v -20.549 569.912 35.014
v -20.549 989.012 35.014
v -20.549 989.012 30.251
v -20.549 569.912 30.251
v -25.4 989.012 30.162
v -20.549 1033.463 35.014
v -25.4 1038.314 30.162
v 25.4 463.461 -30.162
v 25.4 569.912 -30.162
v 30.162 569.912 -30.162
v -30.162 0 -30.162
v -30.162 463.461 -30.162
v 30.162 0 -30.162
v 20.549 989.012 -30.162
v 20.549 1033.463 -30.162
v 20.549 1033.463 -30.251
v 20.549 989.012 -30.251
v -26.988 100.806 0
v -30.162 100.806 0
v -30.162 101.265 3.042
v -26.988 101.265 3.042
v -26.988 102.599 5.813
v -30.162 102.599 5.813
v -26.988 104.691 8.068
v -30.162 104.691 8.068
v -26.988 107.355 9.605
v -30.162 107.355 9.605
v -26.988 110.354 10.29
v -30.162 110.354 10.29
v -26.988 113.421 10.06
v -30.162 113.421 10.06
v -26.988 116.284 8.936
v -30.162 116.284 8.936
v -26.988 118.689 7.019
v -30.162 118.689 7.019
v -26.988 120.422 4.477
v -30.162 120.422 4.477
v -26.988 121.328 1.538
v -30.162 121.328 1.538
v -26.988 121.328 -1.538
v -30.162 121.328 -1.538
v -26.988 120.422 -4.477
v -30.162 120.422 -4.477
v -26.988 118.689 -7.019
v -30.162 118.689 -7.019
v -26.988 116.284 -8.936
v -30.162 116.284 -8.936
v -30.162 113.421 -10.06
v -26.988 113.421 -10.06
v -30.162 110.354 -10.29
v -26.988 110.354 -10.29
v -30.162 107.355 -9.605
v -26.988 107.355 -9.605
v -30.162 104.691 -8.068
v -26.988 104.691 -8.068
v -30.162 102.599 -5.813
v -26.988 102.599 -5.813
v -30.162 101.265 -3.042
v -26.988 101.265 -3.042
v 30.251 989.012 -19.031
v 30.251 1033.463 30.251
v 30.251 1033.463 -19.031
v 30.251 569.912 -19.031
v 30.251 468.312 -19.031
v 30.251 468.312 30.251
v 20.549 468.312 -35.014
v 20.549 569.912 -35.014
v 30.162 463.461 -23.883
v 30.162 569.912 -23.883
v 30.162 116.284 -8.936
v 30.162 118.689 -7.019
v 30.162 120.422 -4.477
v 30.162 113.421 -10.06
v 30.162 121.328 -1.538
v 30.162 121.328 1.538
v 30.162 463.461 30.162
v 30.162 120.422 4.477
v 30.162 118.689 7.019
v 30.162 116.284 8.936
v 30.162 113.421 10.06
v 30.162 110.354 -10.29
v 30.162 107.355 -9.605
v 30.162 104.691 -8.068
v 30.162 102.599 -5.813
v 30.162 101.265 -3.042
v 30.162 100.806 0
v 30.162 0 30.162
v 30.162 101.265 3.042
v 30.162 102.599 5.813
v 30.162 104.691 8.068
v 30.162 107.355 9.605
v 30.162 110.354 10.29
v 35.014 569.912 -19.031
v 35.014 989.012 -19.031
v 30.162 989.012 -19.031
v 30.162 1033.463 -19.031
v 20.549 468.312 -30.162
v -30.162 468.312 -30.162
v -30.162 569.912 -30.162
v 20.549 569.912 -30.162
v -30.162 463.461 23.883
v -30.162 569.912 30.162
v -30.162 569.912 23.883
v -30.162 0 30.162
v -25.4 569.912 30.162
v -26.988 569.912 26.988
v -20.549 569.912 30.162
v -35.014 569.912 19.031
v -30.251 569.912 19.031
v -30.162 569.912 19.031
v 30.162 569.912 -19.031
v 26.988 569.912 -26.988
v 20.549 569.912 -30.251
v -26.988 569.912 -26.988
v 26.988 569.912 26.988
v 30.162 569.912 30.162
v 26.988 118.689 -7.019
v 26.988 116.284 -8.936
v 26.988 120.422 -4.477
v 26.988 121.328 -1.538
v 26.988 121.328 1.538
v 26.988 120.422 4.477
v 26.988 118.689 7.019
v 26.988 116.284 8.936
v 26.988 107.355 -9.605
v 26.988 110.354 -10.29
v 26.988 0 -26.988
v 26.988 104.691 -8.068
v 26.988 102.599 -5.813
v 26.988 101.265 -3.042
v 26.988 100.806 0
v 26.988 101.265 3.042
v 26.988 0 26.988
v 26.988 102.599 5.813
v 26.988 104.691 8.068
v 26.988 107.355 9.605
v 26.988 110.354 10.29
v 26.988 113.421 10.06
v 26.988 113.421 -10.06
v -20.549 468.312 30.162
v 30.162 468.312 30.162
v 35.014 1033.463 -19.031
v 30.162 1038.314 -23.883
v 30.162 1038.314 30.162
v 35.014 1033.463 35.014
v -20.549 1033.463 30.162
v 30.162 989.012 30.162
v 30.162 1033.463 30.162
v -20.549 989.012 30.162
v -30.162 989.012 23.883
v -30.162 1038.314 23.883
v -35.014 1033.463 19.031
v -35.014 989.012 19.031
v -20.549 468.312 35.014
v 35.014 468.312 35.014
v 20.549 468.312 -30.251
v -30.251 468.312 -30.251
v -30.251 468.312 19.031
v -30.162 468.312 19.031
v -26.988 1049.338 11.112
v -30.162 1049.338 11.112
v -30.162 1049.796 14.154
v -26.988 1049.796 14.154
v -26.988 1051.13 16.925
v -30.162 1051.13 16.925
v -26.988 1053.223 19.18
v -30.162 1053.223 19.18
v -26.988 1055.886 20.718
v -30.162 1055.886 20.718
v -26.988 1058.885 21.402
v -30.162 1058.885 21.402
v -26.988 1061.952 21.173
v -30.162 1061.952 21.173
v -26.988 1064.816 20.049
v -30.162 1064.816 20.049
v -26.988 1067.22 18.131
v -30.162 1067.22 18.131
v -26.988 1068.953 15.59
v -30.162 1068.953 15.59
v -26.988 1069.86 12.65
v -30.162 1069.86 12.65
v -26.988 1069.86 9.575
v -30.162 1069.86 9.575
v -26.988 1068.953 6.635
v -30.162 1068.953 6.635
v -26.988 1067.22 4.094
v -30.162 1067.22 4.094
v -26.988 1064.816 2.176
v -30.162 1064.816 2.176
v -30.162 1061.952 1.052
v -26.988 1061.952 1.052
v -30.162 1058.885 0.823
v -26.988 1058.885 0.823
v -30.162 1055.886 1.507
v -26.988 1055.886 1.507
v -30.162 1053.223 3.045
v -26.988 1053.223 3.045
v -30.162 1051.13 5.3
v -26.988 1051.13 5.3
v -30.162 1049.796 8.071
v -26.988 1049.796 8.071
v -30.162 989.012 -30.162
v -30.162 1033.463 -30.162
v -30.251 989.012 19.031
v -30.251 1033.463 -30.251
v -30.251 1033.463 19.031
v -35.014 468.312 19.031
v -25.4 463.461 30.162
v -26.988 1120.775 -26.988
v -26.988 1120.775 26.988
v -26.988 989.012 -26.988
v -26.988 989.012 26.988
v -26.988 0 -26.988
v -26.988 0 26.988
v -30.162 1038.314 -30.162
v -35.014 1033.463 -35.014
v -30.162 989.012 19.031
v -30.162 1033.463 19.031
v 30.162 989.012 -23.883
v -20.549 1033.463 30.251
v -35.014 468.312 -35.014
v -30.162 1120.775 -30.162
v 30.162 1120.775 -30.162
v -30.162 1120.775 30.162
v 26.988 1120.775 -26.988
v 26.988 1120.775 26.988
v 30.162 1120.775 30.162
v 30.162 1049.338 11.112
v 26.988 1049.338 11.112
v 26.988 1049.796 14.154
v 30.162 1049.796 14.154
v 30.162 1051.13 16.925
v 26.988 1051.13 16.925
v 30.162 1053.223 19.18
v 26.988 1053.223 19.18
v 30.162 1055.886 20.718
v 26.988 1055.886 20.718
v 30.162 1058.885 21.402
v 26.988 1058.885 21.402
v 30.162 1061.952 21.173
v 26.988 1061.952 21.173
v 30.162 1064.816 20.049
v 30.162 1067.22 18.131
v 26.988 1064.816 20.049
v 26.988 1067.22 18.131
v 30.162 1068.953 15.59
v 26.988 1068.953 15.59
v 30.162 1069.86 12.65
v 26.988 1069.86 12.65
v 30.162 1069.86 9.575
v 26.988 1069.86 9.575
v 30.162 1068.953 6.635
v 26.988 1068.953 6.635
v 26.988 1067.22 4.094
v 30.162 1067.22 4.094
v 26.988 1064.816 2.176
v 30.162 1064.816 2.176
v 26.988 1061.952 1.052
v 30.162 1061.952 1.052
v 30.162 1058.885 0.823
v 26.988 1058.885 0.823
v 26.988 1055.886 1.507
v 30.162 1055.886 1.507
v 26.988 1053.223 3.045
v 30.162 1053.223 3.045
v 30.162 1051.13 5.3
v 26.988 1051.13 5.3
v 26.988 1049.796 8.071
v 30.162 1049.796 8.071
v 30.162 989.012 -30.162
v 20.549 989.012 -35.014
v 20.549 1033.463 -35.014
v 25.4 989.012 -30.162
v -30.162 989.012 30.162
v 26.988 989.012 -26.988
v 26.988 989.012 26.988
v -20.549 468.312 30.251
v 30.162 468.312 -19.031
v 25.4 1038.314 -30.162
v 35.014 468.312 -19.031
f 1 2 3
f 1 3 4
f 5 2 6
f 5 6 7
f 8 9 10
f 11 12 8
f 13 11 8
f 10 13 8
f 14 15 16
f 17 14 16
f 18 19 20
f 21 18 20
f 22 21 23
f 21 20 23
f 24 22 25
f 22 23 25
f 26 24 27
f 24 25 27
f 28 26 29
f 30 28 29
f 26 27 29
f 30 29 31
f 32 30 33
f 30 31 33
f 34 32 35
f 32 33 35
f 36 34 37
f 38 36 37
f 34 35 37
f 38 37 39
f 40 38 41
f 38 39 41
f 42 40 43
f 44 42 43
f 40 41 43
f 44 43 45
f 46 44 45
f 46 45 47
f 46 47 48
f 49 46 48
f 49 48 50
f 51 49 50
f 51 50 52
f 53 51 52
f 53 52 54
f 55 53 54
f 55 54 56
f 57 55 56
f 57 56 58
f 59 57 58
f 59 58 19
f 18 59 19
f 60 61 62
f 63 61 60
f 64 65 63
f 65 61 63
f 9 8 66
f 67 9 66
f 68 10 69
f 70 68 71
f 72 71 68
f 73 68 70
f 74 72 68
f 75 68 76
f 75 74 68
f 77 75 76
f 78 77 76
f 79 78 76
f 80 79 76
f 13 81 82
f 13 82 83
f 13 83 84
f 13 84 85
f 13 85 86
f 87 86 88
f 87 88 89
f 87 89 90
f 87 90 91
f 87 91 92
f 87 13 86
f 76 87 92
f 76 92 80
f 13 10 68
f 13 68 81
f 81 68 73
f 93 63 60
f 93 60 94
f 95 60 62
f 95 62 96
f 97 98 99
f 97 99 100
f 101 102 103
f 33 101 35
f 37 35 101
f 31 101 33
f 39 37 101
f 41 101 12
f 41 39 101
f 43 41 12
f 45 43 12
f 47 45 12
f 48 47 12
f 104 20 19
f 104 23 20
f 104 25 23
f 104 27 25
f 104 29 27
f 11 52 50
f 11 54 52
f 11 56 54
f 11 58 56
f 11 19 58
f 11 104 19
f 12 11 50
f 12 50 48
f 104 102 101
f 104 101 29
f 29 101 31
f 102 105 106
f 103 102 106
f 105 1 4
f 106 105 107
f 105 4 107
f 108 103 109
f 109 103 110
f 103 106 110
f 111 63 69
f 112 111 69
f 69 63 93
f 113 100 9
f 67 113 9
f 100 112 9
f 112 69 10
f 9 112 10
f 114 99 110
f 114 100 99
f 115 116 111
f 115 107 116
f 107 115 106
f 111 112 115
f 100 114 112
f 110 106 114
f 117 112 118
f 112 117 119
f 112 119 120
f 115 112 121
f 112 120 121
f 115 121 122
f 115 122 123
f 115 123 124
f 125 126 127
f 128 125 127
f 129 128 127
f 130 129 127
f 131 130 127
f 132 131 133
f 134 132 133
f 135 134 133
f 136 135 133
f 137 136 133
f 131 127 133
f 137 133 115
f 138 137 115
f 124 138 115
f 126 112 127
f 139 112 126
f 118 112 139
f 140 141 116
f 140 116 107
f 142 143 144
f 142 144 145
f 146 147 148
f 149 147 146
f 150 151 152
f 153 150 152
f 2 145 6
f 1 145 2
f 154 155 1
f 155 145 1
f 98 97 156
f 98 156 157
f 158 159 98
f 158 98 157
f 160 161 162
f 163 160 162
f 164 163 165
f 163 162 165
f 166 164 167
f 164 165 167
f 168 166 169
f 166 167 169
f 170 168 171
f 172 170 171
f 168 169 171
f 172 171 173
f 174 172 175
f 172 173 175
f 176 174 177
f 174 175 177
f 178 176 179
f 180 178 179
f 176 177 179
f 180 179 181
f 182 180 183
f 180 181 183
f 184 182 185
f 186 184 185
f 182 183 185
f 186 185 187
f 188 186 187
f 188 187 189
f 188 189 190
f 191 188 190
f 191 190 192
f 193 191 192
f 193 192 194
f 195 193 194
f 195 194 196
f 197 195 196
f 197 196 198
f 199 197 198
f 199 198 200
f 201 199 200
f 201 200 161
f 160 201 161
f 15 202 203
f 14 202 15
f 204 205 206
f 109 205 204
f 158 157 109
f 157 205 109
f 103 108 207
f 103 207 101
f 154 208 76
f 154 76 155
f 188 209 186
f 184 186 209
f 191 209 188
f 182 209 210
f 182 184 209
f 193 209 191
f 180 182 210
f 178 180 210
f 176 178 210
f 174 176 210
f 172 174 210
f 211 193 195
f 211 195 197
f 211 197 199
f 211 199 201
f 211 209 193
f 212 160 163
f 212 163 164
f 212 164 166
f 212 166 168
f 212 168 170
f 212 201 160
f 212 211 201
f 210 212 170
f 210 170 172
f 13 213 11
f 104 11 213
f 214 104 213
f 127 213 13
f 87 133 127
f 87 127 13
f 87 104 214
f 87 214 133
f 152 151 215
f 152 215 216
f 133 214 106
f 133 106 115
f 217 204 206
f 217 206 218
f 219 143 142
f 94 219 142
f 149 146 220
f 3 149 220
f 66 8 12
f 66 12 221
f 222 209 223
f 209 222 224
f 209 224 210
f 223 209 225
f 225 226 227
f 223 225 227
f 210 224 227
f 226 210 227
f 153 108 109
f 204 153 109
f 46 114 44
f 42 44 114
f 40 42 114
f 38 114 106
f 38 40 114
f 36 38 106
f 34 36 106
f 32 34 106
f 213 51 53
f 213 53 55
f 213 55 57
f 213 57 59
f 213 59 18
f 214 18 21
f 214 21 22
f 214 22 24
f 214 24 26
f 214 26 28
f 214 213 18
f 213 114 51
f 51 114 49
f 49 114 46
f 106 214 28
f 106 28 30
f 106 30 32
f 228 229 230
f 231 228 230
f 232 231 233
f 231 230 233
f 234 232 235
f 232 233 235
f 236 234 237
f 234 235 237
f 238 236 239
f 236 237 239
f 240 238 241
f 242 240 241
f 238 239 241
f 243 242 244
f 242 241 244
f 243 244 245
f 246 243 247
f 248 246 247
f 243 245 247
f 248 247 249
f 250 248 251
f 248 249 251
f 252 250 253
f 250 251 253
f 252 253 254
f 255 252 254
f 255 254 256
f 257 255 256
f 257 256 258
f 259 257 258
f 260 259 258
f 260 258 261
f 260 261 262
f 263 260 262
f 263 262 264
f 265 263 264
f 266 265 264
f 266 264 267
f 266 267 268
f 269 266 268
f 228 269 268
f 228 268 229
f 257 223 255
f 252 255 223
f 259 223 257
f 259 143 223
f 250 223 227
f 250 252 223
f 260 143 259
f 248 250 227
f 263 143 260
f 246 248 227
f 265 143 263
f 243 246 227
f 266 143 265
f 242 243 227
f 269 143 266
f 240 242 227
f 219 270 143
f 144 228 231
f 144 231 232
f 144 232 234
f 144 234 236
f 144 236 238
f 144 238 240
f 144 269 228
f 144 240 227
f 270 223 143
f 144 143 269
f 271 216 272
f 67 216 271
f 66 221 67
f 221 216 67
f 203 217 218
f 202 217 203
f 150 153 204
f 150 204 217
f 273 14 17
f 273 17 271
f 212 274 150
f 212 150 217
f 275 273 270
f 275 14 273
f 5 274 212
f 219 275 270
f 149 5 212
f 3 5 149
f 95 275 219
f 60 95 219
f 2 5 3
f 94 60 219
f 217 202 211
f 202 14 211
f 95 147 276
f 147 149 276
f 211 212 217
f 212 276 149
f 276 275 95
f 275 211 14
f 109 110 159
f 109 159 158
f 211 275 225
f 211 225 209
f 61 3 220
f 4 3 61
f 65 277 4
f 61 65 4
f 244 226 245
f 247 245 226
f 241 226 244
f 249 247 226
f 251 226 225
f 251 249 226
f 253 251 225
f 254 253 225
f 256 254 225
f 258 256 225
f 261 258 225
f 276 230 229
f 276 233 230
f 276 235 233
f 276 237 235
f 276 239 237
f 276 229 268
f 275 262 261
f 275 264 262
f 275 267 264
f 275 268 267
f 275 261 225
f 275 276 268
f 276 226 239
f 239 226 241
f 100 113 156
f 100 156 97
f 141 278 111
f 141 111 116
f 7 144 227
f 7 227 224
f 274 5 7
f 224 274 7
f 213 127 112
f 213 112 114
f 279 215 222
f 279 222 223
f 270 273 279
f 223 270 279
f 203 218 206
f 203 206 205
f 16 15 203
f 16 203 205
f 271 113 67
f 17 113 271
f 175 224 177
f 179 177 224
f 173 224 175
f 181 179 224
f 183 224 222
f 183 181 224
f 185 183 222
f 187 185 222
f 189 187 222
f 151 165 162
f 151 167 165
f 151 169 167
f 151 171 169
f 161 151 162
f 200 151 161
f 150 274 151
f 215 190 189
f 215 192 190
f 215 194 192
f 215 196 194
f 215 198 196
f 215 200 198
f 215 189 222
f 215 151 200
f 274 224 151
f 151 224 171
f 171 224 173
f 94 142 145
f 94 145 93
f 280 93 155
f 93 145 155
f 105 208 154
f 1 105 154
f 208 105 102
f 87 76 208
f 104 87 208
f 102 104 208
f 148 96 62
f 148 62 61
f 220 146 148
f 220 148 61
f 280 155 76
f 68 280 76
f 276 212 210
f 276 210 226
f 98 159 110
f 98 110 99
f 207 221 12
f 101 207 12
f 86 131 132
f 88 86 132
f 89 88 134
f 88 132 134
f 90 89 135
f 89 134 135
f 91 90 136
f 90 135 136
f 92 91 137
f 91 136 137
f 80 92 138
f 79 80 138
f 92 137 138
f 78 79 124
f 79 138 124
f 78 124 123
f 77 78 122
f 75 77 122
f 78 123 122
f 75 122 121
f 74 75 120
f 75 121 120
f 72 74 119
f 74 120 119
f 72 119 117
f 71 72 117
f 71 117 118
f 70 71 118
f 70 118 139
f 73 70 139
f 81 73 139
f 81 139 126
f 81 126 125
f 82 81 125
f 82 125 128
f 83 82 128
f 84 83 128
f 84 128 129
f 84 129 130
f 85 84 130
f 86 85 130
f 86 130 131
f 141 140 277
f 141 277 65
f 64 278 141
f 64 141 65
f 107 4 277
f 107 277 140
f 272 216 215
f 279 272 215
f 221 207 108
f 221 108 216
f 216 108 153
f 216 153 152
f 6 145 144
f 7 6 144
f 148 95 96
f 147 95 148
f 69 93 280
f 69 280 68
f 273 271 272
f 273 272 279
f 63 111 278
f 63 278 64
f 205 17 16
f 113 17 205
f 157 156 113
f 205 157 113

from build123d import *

# Parameters (mm, degrees)
F1_DEPTH  = 1120.775
F3_DEPTH  = 53.34
F6_DEPTH  = 565.15
F8_DEPTH  = 55.5625
F10_DEPTH = 45.155127
F12_DEPTH = 25.4
F14_DEPTH = 25.4
F16_DEPTH = 55.5625
F18_DEPTH = 49.193727
F20_DEPTH = 25.4
F22_DEPTH = 113.792
F24_DEPTH = 25.4
F26_DEPTH = 25.4
F28_DEPTH = 25.4
F30_DEPTH = 254
F32_DEPTH = 63.5
F34_DEPTH = 25.4
F36_DEPTH = 25.4
F38_DEPTH = 25.4
F40_DEPTH = 25.4
F41_W     = 53.975
F41_H     = 53.975
F42_DEPTH = 1239.52
F43_R     = 10.31875
F44_DEPTH = 89.662
F45_R     = 10.31875
F46_DEPTH = 179.832


with BuildPart() as f1:
    # F0 (on Front) → F1 (new body)
    with BuildSketch(Plane.XZ):
        Polygon((30.1625, 30.1625), (26.9875, 30.1625), (-26.9875, 30.1625), (-30.1625, 30.1625), (-30.1625, 26.9875), (-30.1625, -26.9875), (-30.1625, -30.1625), (-26.9875, -30.1625), (26.9875, -30.1625), (30.1625, -30.1625), (30.1625, -26.9875), (30.1625, 26.9875), align=None)
        Polygon((-23.8125, 26.9875), (23.8125, 26.9875), (26.9875, 26.9875), (26.9875, 23.8125), (26.9875, -23.8125), (26.9875, -26.9875), (23.8125, -26.9875), (-23.8125, -26.9875), (-26.9875, -26.9875), (-26.9875, -23.8125), (-26.9875, 23.8125), (-26.9875, 26.9875), align=None, mode=Mode.SUBTRACT)
    extrude(amount=-F1_DEPTH)

    # F2 (on Right) → F3 (cut, symmetric)
    with BuildSketch(Plane.YZ):
        Polygon((569.9125, 80.052234), (569.9125, 0), (569.9125, -86.322285), (989.0125, -86.322285), (989.0125, 80.052234), align=None)
    extrude(amount=F3_DEPTH, both=True, mode=Mode.SUBTRACT)



with BuildPart() as f6:
    # F5 (on offset) → F6 (new body)
    with BuildSketch(Plane.XZ.offset(-468.3125)):
        Polygon((-20.5486, 35.0139), (-20.5486, 30.2514), (30.2514, 30.2514), (30.2514, -19.031227), (35.0139, -19.031227), (35.0139, 35.0139), align=None)
        Polygon((-30.2514, 19.031227), (-35.0139, 19.031227), (-35.0139, -35.0139), (20.5486, -35.0139), (20.5486, -30.2514), (-30.2514, -30.2514), align=None)
    extrude(amount=-F6_DEPTH)


with BuildPart() as f1_1:
    add(f1.part)

    add(f6.part)  # F8 merges F6
    # F7 (on face) → F8 (join, through all)
    with BuildSketch(Plane(origin=(-20.5486, 0, 0), x_dir=(0, -1, 0), z_dir=(-1, 0, 0))):
        Polygon((-1033.4625, 30.2514), (-1033.4625, 35.0139), (-1042.3525, 26.1239), (-1033.4625, 26.1239), align=None)
        Polygon((-459.4225, 26.1239), (-468.3125, 35.0139), (-468.3125, 30.2514), (-468.3125, 26.1239), align=None)
    extrude(amount=-F8_DEPTH)

    # F9 (on face) → F10 (join, through all)
    with BuildSketch(Plane(origin=(0, 0, -19.031227), x_dir=(1, 0, 0), z_dir=(0, 0, -1))):
        Polygon((30.2514, -468.3125), (35.0139, -468.3125), (26.1239, -459.4225), (26.1239, -468.3125), align=None)
        Polygon((26.1239, -1042.3525), (35.0139, -1033.4625), (30.2514, -1033.4625), (26.1239, -1033.4625), align=None)
    extrude(amount=-F10_DEPTH)

    # F11 (on face) → F12 (cut)
    with BuildSketch(Plane(origin=(0, 0, 26.1239), x_dir=(1, 0, 0), z_dir=(0, 0, -1))):
        Polygon((35.0139, -459.4225), (30.1625, -459.4225), (30.1625, -463.4611), (35.0139, -468.3125), align=None)
    extrude(amount=-F12_DEPTH, mode=Mode.SUBTRACT)

    # F13 (on face) → F14 (cut)
    with BuildSketch(Plane(origin=(0, 0, 26.1239), x_dir=(1, 0, 0), z_dir=(0, 0, -1))):
        Polygon((35.0139, -1042.3525), (35.0139, -1033.4625), (30.1625, -1038.3139), (30.1625, -1042.3525), align=None)
    extrude(amount=-F14_DEPTH, mode=Mode.SUBTRACT)

    # F15 (on face) → F16 (join, through all)
    with BuildSketch(Plane.YZ.offset(20.5486)):
        Polygon((459.4225, -26.1239), (468.3125, -35.0139), (468.3125, -26.1239), align=None)
        Polygon((1033.4625, -26.1239), (1033.4625, -35.0139), (1042.3525, -26.1239), align=None)
    extrude(amount=-F16_DEPTH)

    # F17 (on face) → F18 (join, through all)
    with BuildSketch(Plane.XY.offset(19.031227)):
        Polygon((-26.1239, 468.3125), (-35.0139, 468.3125), (-26.1239, 459.4225), align=None)
        Polygon((-26.1239, 1042.3525), (-35.0139, 1033.4625), (-26.1239, 1033.4625), align=None)
    extrude(amount=-F18_DEPTH)

    # F19 (on face) → F20 (cut)
    with BuildSketch(Plane.XY.offset(-26.1239)):
        Polygon((-35.0139, 1033.4625), (-30.1625, 1038.3139), (-30.1625, 1042.3525), (-35.0139, 1042.3525), align=None)
    extrude(amount=-F20_DEPTH, mode=Mode.SUBTRACT)

    # F21 (on face) → F22 (join)
    with BuildSketch(Plane(origin=(0, 569.9125, 0), x_dir=(-1, 0, 0), z_dir=(0, 1, 0))):
        Polygon((29.4386, 26.1239), (20.5486, 35.0139), (20.5486, 26.1239), (26.1239, 26.1239), (26.1239, 27.921227), (27.921227, 26.1239), align=None)
        Polygon((27.921227, 26.1239), (26.1239, 26.1239), (26.1239, 19.031227), (35.0139, 19.031227), align=None)
        Polygon((-26.1239, -26.1239), (-26.1239, -19.031227), (-35.0139, -19.031227), (-27.921227, -26.1239), align=None)
        Polygon((-20.5486, -26.1239), (-26.1239, -26.1239), (-26.1239, -27.921227), (-27.921227, -26.1239), (-29.4386, -26.1239), (-20.5486, -35.0139), align=None)
    extrude(amount=-F22_DEPTH)

    # F23 (on face) → F24 (cut)
    with BuildSketch(Plane(origin=(20.5486, 0, 0), x_dir=(0, -1, 0), z_dir=(-1, 0, 0))):
        Polygon((-468.3125, -35.0139), (-456.1205, -35.0139), (-456.1205, -30.1625), (-463.4611, -30.1625), align=None)
    extrude(amount=-F24_DEPTH, mode=Mode.SUBTRACT)

    # F25 (on face) → F26 (cut)
    with BuildSketch(Plane.XY.offset(-19.031227)):
        Polygon((35.0139, 468.3125), (30.1625, 463.4611), (30.1625, 456.1205), (35.0139, 456.1205), align=None)
    extrude(amount=-F26_DEPTH, mode=Mode.SUBTRACT)

    # F27 (on face) → F28 (cut)
    with BuildSketch(Plane.YZ.offset(-20.5486)):
        Polygon((456.1205, 35.0139), (456.1205, 30.1625), (463.4611, 30.1625), (468.3125, 35.0139), align=None)
    extrude(amount=-F28_DEPTH, mode=Mode.SUBTRACT)

    # F29 (on face) → F30 (cut, symmetric)
    with BuildSketch(Plane(origin=(0, 0, 19.031227), x_dir=(1, 0, 0), z_dir=(0, 0, -1))):
        Polygon((-35.0139, -468.3125), (-30.1625, -463.4611), (-30.1625, -456.1205), (-35.0139, -456.1205), align=None)
    extrude(amount=F30_DEPTH, both=True, mode=Mode.SUBTRACT)

    # F31 (on face) → F32 (join)
    with BuildSketch(Plane.XZ.offset(-989.0125)):
        Polygon((-35.0139, 19.031227), (-26.1239, 19.031227), (-26.1239, 26.1239), (-27.921227, 26.1239), align=None)
        Polygon((-26.1239, 27.921227), (-26.1239, 26.1239), (-20.5486, 26.1239), (-20.5486, 35.0139), (-29.4386, 26.1239), (-27.921227, 26.1239), align=None)
        Polygon((20.5486, -26.1239), (20.5486, -35.0139), (29.4386, -26.1239), (27.921227, -26.1239), (26.1239, -27.921227), (26.1239, -26.1239), align=None)
        Polygon((26.1239, -19.031227), (26.1239, -26.1239), (27.921227, -26.1239), (35.0139, -19.031227), align=None)
    extrude(amount=-F32_DEPTH)

    # F33 (on face) → F34 (cut)
    with BuildSketch(Plane(origin=(20.5486, 0, 0), x_dir=(0, -1, 0), z_dir=(-1, 0, 0))):
        Polygon((-1052.5125, -35.0139), (-1033.4625, -35.0139), (-1038.3139, -30.1625), (-1052.5125, -30.1625), align=None)
    extrude(amount=-F34_DEPTH, mode=Mode.SUBTRACT)

    # F35 (on face) → F36 (cut)
    with BuildSketch(Plane(origin=(0, 0, 19.031227), x_dir=(1, 0, 0), z_dir=(0, 0, -1))):
        Polygon((-30.1625, -1038.3139), (-35.0139, -1033.4625), (-35.0139, -1052.5125), (-30.1625, -1052.5125), align=None)
    extrude(amount=-F36_DEPTH, mode=Mode.SUBTRACT)

    # F37 (on face) → F38 (cut)
    with BuildSketch(Plane.YZ.offset(-20.5486)):
        Polygon((1052.5125, 35.0139), (1033.4625, 35.0139), (1038.3139, 30.1625), (1052.5125, 30.1625), align=None)
    extrude(amount=-F38_DEPTH, mode=Mode.SUBTRACT)

    # F39 (on face) → F40 (cut)
    with BuildSketch(Plane.XY.offset(-19.031227)):
        Polygon((30.1625, 1052.5125), (30.1625, 1038.3139), (35.0139, 1033.4625), (35.0139, 1052.5125), align=None)
    extrude(amount=-F40_DEPTH, mode=Mode.SUBTRACT)

    # F41 (on face) → F42 (cut)
    with BuildSketch(Plane.XZ):
        Rectangle(F41_W, F41_H)
    extrude(amount=-F42_DEPTH, mode=Mode.SUBTRACT)

    # F43 (on face) → F44 (cut)
    with BuildSketch(Plane(origin=(-30.1625, 0, 0), x_dir=(0, -1, 0), z_dir=(-1, 0, 0))):
        with Locations((-1059.65625, 11.1125)):
            Circle(F43_R)
    extrude(amount=-F44_DEPTH, mode=Mode.SUBTRACT)

    # F45 (on face) → F46 (cut)
    with BuildSketch(Plane(origin=(-30.1625, 0, 0), x_dir=(0, -1, 0), z_dir=(-1, 0, 0))):
        with Locations((-111.125, 0)):
            Circle(F45_R)
    extrude(amount=-F46_DEPTH, mode=Mode.SUBTRACT)


solid = f1_1.part
